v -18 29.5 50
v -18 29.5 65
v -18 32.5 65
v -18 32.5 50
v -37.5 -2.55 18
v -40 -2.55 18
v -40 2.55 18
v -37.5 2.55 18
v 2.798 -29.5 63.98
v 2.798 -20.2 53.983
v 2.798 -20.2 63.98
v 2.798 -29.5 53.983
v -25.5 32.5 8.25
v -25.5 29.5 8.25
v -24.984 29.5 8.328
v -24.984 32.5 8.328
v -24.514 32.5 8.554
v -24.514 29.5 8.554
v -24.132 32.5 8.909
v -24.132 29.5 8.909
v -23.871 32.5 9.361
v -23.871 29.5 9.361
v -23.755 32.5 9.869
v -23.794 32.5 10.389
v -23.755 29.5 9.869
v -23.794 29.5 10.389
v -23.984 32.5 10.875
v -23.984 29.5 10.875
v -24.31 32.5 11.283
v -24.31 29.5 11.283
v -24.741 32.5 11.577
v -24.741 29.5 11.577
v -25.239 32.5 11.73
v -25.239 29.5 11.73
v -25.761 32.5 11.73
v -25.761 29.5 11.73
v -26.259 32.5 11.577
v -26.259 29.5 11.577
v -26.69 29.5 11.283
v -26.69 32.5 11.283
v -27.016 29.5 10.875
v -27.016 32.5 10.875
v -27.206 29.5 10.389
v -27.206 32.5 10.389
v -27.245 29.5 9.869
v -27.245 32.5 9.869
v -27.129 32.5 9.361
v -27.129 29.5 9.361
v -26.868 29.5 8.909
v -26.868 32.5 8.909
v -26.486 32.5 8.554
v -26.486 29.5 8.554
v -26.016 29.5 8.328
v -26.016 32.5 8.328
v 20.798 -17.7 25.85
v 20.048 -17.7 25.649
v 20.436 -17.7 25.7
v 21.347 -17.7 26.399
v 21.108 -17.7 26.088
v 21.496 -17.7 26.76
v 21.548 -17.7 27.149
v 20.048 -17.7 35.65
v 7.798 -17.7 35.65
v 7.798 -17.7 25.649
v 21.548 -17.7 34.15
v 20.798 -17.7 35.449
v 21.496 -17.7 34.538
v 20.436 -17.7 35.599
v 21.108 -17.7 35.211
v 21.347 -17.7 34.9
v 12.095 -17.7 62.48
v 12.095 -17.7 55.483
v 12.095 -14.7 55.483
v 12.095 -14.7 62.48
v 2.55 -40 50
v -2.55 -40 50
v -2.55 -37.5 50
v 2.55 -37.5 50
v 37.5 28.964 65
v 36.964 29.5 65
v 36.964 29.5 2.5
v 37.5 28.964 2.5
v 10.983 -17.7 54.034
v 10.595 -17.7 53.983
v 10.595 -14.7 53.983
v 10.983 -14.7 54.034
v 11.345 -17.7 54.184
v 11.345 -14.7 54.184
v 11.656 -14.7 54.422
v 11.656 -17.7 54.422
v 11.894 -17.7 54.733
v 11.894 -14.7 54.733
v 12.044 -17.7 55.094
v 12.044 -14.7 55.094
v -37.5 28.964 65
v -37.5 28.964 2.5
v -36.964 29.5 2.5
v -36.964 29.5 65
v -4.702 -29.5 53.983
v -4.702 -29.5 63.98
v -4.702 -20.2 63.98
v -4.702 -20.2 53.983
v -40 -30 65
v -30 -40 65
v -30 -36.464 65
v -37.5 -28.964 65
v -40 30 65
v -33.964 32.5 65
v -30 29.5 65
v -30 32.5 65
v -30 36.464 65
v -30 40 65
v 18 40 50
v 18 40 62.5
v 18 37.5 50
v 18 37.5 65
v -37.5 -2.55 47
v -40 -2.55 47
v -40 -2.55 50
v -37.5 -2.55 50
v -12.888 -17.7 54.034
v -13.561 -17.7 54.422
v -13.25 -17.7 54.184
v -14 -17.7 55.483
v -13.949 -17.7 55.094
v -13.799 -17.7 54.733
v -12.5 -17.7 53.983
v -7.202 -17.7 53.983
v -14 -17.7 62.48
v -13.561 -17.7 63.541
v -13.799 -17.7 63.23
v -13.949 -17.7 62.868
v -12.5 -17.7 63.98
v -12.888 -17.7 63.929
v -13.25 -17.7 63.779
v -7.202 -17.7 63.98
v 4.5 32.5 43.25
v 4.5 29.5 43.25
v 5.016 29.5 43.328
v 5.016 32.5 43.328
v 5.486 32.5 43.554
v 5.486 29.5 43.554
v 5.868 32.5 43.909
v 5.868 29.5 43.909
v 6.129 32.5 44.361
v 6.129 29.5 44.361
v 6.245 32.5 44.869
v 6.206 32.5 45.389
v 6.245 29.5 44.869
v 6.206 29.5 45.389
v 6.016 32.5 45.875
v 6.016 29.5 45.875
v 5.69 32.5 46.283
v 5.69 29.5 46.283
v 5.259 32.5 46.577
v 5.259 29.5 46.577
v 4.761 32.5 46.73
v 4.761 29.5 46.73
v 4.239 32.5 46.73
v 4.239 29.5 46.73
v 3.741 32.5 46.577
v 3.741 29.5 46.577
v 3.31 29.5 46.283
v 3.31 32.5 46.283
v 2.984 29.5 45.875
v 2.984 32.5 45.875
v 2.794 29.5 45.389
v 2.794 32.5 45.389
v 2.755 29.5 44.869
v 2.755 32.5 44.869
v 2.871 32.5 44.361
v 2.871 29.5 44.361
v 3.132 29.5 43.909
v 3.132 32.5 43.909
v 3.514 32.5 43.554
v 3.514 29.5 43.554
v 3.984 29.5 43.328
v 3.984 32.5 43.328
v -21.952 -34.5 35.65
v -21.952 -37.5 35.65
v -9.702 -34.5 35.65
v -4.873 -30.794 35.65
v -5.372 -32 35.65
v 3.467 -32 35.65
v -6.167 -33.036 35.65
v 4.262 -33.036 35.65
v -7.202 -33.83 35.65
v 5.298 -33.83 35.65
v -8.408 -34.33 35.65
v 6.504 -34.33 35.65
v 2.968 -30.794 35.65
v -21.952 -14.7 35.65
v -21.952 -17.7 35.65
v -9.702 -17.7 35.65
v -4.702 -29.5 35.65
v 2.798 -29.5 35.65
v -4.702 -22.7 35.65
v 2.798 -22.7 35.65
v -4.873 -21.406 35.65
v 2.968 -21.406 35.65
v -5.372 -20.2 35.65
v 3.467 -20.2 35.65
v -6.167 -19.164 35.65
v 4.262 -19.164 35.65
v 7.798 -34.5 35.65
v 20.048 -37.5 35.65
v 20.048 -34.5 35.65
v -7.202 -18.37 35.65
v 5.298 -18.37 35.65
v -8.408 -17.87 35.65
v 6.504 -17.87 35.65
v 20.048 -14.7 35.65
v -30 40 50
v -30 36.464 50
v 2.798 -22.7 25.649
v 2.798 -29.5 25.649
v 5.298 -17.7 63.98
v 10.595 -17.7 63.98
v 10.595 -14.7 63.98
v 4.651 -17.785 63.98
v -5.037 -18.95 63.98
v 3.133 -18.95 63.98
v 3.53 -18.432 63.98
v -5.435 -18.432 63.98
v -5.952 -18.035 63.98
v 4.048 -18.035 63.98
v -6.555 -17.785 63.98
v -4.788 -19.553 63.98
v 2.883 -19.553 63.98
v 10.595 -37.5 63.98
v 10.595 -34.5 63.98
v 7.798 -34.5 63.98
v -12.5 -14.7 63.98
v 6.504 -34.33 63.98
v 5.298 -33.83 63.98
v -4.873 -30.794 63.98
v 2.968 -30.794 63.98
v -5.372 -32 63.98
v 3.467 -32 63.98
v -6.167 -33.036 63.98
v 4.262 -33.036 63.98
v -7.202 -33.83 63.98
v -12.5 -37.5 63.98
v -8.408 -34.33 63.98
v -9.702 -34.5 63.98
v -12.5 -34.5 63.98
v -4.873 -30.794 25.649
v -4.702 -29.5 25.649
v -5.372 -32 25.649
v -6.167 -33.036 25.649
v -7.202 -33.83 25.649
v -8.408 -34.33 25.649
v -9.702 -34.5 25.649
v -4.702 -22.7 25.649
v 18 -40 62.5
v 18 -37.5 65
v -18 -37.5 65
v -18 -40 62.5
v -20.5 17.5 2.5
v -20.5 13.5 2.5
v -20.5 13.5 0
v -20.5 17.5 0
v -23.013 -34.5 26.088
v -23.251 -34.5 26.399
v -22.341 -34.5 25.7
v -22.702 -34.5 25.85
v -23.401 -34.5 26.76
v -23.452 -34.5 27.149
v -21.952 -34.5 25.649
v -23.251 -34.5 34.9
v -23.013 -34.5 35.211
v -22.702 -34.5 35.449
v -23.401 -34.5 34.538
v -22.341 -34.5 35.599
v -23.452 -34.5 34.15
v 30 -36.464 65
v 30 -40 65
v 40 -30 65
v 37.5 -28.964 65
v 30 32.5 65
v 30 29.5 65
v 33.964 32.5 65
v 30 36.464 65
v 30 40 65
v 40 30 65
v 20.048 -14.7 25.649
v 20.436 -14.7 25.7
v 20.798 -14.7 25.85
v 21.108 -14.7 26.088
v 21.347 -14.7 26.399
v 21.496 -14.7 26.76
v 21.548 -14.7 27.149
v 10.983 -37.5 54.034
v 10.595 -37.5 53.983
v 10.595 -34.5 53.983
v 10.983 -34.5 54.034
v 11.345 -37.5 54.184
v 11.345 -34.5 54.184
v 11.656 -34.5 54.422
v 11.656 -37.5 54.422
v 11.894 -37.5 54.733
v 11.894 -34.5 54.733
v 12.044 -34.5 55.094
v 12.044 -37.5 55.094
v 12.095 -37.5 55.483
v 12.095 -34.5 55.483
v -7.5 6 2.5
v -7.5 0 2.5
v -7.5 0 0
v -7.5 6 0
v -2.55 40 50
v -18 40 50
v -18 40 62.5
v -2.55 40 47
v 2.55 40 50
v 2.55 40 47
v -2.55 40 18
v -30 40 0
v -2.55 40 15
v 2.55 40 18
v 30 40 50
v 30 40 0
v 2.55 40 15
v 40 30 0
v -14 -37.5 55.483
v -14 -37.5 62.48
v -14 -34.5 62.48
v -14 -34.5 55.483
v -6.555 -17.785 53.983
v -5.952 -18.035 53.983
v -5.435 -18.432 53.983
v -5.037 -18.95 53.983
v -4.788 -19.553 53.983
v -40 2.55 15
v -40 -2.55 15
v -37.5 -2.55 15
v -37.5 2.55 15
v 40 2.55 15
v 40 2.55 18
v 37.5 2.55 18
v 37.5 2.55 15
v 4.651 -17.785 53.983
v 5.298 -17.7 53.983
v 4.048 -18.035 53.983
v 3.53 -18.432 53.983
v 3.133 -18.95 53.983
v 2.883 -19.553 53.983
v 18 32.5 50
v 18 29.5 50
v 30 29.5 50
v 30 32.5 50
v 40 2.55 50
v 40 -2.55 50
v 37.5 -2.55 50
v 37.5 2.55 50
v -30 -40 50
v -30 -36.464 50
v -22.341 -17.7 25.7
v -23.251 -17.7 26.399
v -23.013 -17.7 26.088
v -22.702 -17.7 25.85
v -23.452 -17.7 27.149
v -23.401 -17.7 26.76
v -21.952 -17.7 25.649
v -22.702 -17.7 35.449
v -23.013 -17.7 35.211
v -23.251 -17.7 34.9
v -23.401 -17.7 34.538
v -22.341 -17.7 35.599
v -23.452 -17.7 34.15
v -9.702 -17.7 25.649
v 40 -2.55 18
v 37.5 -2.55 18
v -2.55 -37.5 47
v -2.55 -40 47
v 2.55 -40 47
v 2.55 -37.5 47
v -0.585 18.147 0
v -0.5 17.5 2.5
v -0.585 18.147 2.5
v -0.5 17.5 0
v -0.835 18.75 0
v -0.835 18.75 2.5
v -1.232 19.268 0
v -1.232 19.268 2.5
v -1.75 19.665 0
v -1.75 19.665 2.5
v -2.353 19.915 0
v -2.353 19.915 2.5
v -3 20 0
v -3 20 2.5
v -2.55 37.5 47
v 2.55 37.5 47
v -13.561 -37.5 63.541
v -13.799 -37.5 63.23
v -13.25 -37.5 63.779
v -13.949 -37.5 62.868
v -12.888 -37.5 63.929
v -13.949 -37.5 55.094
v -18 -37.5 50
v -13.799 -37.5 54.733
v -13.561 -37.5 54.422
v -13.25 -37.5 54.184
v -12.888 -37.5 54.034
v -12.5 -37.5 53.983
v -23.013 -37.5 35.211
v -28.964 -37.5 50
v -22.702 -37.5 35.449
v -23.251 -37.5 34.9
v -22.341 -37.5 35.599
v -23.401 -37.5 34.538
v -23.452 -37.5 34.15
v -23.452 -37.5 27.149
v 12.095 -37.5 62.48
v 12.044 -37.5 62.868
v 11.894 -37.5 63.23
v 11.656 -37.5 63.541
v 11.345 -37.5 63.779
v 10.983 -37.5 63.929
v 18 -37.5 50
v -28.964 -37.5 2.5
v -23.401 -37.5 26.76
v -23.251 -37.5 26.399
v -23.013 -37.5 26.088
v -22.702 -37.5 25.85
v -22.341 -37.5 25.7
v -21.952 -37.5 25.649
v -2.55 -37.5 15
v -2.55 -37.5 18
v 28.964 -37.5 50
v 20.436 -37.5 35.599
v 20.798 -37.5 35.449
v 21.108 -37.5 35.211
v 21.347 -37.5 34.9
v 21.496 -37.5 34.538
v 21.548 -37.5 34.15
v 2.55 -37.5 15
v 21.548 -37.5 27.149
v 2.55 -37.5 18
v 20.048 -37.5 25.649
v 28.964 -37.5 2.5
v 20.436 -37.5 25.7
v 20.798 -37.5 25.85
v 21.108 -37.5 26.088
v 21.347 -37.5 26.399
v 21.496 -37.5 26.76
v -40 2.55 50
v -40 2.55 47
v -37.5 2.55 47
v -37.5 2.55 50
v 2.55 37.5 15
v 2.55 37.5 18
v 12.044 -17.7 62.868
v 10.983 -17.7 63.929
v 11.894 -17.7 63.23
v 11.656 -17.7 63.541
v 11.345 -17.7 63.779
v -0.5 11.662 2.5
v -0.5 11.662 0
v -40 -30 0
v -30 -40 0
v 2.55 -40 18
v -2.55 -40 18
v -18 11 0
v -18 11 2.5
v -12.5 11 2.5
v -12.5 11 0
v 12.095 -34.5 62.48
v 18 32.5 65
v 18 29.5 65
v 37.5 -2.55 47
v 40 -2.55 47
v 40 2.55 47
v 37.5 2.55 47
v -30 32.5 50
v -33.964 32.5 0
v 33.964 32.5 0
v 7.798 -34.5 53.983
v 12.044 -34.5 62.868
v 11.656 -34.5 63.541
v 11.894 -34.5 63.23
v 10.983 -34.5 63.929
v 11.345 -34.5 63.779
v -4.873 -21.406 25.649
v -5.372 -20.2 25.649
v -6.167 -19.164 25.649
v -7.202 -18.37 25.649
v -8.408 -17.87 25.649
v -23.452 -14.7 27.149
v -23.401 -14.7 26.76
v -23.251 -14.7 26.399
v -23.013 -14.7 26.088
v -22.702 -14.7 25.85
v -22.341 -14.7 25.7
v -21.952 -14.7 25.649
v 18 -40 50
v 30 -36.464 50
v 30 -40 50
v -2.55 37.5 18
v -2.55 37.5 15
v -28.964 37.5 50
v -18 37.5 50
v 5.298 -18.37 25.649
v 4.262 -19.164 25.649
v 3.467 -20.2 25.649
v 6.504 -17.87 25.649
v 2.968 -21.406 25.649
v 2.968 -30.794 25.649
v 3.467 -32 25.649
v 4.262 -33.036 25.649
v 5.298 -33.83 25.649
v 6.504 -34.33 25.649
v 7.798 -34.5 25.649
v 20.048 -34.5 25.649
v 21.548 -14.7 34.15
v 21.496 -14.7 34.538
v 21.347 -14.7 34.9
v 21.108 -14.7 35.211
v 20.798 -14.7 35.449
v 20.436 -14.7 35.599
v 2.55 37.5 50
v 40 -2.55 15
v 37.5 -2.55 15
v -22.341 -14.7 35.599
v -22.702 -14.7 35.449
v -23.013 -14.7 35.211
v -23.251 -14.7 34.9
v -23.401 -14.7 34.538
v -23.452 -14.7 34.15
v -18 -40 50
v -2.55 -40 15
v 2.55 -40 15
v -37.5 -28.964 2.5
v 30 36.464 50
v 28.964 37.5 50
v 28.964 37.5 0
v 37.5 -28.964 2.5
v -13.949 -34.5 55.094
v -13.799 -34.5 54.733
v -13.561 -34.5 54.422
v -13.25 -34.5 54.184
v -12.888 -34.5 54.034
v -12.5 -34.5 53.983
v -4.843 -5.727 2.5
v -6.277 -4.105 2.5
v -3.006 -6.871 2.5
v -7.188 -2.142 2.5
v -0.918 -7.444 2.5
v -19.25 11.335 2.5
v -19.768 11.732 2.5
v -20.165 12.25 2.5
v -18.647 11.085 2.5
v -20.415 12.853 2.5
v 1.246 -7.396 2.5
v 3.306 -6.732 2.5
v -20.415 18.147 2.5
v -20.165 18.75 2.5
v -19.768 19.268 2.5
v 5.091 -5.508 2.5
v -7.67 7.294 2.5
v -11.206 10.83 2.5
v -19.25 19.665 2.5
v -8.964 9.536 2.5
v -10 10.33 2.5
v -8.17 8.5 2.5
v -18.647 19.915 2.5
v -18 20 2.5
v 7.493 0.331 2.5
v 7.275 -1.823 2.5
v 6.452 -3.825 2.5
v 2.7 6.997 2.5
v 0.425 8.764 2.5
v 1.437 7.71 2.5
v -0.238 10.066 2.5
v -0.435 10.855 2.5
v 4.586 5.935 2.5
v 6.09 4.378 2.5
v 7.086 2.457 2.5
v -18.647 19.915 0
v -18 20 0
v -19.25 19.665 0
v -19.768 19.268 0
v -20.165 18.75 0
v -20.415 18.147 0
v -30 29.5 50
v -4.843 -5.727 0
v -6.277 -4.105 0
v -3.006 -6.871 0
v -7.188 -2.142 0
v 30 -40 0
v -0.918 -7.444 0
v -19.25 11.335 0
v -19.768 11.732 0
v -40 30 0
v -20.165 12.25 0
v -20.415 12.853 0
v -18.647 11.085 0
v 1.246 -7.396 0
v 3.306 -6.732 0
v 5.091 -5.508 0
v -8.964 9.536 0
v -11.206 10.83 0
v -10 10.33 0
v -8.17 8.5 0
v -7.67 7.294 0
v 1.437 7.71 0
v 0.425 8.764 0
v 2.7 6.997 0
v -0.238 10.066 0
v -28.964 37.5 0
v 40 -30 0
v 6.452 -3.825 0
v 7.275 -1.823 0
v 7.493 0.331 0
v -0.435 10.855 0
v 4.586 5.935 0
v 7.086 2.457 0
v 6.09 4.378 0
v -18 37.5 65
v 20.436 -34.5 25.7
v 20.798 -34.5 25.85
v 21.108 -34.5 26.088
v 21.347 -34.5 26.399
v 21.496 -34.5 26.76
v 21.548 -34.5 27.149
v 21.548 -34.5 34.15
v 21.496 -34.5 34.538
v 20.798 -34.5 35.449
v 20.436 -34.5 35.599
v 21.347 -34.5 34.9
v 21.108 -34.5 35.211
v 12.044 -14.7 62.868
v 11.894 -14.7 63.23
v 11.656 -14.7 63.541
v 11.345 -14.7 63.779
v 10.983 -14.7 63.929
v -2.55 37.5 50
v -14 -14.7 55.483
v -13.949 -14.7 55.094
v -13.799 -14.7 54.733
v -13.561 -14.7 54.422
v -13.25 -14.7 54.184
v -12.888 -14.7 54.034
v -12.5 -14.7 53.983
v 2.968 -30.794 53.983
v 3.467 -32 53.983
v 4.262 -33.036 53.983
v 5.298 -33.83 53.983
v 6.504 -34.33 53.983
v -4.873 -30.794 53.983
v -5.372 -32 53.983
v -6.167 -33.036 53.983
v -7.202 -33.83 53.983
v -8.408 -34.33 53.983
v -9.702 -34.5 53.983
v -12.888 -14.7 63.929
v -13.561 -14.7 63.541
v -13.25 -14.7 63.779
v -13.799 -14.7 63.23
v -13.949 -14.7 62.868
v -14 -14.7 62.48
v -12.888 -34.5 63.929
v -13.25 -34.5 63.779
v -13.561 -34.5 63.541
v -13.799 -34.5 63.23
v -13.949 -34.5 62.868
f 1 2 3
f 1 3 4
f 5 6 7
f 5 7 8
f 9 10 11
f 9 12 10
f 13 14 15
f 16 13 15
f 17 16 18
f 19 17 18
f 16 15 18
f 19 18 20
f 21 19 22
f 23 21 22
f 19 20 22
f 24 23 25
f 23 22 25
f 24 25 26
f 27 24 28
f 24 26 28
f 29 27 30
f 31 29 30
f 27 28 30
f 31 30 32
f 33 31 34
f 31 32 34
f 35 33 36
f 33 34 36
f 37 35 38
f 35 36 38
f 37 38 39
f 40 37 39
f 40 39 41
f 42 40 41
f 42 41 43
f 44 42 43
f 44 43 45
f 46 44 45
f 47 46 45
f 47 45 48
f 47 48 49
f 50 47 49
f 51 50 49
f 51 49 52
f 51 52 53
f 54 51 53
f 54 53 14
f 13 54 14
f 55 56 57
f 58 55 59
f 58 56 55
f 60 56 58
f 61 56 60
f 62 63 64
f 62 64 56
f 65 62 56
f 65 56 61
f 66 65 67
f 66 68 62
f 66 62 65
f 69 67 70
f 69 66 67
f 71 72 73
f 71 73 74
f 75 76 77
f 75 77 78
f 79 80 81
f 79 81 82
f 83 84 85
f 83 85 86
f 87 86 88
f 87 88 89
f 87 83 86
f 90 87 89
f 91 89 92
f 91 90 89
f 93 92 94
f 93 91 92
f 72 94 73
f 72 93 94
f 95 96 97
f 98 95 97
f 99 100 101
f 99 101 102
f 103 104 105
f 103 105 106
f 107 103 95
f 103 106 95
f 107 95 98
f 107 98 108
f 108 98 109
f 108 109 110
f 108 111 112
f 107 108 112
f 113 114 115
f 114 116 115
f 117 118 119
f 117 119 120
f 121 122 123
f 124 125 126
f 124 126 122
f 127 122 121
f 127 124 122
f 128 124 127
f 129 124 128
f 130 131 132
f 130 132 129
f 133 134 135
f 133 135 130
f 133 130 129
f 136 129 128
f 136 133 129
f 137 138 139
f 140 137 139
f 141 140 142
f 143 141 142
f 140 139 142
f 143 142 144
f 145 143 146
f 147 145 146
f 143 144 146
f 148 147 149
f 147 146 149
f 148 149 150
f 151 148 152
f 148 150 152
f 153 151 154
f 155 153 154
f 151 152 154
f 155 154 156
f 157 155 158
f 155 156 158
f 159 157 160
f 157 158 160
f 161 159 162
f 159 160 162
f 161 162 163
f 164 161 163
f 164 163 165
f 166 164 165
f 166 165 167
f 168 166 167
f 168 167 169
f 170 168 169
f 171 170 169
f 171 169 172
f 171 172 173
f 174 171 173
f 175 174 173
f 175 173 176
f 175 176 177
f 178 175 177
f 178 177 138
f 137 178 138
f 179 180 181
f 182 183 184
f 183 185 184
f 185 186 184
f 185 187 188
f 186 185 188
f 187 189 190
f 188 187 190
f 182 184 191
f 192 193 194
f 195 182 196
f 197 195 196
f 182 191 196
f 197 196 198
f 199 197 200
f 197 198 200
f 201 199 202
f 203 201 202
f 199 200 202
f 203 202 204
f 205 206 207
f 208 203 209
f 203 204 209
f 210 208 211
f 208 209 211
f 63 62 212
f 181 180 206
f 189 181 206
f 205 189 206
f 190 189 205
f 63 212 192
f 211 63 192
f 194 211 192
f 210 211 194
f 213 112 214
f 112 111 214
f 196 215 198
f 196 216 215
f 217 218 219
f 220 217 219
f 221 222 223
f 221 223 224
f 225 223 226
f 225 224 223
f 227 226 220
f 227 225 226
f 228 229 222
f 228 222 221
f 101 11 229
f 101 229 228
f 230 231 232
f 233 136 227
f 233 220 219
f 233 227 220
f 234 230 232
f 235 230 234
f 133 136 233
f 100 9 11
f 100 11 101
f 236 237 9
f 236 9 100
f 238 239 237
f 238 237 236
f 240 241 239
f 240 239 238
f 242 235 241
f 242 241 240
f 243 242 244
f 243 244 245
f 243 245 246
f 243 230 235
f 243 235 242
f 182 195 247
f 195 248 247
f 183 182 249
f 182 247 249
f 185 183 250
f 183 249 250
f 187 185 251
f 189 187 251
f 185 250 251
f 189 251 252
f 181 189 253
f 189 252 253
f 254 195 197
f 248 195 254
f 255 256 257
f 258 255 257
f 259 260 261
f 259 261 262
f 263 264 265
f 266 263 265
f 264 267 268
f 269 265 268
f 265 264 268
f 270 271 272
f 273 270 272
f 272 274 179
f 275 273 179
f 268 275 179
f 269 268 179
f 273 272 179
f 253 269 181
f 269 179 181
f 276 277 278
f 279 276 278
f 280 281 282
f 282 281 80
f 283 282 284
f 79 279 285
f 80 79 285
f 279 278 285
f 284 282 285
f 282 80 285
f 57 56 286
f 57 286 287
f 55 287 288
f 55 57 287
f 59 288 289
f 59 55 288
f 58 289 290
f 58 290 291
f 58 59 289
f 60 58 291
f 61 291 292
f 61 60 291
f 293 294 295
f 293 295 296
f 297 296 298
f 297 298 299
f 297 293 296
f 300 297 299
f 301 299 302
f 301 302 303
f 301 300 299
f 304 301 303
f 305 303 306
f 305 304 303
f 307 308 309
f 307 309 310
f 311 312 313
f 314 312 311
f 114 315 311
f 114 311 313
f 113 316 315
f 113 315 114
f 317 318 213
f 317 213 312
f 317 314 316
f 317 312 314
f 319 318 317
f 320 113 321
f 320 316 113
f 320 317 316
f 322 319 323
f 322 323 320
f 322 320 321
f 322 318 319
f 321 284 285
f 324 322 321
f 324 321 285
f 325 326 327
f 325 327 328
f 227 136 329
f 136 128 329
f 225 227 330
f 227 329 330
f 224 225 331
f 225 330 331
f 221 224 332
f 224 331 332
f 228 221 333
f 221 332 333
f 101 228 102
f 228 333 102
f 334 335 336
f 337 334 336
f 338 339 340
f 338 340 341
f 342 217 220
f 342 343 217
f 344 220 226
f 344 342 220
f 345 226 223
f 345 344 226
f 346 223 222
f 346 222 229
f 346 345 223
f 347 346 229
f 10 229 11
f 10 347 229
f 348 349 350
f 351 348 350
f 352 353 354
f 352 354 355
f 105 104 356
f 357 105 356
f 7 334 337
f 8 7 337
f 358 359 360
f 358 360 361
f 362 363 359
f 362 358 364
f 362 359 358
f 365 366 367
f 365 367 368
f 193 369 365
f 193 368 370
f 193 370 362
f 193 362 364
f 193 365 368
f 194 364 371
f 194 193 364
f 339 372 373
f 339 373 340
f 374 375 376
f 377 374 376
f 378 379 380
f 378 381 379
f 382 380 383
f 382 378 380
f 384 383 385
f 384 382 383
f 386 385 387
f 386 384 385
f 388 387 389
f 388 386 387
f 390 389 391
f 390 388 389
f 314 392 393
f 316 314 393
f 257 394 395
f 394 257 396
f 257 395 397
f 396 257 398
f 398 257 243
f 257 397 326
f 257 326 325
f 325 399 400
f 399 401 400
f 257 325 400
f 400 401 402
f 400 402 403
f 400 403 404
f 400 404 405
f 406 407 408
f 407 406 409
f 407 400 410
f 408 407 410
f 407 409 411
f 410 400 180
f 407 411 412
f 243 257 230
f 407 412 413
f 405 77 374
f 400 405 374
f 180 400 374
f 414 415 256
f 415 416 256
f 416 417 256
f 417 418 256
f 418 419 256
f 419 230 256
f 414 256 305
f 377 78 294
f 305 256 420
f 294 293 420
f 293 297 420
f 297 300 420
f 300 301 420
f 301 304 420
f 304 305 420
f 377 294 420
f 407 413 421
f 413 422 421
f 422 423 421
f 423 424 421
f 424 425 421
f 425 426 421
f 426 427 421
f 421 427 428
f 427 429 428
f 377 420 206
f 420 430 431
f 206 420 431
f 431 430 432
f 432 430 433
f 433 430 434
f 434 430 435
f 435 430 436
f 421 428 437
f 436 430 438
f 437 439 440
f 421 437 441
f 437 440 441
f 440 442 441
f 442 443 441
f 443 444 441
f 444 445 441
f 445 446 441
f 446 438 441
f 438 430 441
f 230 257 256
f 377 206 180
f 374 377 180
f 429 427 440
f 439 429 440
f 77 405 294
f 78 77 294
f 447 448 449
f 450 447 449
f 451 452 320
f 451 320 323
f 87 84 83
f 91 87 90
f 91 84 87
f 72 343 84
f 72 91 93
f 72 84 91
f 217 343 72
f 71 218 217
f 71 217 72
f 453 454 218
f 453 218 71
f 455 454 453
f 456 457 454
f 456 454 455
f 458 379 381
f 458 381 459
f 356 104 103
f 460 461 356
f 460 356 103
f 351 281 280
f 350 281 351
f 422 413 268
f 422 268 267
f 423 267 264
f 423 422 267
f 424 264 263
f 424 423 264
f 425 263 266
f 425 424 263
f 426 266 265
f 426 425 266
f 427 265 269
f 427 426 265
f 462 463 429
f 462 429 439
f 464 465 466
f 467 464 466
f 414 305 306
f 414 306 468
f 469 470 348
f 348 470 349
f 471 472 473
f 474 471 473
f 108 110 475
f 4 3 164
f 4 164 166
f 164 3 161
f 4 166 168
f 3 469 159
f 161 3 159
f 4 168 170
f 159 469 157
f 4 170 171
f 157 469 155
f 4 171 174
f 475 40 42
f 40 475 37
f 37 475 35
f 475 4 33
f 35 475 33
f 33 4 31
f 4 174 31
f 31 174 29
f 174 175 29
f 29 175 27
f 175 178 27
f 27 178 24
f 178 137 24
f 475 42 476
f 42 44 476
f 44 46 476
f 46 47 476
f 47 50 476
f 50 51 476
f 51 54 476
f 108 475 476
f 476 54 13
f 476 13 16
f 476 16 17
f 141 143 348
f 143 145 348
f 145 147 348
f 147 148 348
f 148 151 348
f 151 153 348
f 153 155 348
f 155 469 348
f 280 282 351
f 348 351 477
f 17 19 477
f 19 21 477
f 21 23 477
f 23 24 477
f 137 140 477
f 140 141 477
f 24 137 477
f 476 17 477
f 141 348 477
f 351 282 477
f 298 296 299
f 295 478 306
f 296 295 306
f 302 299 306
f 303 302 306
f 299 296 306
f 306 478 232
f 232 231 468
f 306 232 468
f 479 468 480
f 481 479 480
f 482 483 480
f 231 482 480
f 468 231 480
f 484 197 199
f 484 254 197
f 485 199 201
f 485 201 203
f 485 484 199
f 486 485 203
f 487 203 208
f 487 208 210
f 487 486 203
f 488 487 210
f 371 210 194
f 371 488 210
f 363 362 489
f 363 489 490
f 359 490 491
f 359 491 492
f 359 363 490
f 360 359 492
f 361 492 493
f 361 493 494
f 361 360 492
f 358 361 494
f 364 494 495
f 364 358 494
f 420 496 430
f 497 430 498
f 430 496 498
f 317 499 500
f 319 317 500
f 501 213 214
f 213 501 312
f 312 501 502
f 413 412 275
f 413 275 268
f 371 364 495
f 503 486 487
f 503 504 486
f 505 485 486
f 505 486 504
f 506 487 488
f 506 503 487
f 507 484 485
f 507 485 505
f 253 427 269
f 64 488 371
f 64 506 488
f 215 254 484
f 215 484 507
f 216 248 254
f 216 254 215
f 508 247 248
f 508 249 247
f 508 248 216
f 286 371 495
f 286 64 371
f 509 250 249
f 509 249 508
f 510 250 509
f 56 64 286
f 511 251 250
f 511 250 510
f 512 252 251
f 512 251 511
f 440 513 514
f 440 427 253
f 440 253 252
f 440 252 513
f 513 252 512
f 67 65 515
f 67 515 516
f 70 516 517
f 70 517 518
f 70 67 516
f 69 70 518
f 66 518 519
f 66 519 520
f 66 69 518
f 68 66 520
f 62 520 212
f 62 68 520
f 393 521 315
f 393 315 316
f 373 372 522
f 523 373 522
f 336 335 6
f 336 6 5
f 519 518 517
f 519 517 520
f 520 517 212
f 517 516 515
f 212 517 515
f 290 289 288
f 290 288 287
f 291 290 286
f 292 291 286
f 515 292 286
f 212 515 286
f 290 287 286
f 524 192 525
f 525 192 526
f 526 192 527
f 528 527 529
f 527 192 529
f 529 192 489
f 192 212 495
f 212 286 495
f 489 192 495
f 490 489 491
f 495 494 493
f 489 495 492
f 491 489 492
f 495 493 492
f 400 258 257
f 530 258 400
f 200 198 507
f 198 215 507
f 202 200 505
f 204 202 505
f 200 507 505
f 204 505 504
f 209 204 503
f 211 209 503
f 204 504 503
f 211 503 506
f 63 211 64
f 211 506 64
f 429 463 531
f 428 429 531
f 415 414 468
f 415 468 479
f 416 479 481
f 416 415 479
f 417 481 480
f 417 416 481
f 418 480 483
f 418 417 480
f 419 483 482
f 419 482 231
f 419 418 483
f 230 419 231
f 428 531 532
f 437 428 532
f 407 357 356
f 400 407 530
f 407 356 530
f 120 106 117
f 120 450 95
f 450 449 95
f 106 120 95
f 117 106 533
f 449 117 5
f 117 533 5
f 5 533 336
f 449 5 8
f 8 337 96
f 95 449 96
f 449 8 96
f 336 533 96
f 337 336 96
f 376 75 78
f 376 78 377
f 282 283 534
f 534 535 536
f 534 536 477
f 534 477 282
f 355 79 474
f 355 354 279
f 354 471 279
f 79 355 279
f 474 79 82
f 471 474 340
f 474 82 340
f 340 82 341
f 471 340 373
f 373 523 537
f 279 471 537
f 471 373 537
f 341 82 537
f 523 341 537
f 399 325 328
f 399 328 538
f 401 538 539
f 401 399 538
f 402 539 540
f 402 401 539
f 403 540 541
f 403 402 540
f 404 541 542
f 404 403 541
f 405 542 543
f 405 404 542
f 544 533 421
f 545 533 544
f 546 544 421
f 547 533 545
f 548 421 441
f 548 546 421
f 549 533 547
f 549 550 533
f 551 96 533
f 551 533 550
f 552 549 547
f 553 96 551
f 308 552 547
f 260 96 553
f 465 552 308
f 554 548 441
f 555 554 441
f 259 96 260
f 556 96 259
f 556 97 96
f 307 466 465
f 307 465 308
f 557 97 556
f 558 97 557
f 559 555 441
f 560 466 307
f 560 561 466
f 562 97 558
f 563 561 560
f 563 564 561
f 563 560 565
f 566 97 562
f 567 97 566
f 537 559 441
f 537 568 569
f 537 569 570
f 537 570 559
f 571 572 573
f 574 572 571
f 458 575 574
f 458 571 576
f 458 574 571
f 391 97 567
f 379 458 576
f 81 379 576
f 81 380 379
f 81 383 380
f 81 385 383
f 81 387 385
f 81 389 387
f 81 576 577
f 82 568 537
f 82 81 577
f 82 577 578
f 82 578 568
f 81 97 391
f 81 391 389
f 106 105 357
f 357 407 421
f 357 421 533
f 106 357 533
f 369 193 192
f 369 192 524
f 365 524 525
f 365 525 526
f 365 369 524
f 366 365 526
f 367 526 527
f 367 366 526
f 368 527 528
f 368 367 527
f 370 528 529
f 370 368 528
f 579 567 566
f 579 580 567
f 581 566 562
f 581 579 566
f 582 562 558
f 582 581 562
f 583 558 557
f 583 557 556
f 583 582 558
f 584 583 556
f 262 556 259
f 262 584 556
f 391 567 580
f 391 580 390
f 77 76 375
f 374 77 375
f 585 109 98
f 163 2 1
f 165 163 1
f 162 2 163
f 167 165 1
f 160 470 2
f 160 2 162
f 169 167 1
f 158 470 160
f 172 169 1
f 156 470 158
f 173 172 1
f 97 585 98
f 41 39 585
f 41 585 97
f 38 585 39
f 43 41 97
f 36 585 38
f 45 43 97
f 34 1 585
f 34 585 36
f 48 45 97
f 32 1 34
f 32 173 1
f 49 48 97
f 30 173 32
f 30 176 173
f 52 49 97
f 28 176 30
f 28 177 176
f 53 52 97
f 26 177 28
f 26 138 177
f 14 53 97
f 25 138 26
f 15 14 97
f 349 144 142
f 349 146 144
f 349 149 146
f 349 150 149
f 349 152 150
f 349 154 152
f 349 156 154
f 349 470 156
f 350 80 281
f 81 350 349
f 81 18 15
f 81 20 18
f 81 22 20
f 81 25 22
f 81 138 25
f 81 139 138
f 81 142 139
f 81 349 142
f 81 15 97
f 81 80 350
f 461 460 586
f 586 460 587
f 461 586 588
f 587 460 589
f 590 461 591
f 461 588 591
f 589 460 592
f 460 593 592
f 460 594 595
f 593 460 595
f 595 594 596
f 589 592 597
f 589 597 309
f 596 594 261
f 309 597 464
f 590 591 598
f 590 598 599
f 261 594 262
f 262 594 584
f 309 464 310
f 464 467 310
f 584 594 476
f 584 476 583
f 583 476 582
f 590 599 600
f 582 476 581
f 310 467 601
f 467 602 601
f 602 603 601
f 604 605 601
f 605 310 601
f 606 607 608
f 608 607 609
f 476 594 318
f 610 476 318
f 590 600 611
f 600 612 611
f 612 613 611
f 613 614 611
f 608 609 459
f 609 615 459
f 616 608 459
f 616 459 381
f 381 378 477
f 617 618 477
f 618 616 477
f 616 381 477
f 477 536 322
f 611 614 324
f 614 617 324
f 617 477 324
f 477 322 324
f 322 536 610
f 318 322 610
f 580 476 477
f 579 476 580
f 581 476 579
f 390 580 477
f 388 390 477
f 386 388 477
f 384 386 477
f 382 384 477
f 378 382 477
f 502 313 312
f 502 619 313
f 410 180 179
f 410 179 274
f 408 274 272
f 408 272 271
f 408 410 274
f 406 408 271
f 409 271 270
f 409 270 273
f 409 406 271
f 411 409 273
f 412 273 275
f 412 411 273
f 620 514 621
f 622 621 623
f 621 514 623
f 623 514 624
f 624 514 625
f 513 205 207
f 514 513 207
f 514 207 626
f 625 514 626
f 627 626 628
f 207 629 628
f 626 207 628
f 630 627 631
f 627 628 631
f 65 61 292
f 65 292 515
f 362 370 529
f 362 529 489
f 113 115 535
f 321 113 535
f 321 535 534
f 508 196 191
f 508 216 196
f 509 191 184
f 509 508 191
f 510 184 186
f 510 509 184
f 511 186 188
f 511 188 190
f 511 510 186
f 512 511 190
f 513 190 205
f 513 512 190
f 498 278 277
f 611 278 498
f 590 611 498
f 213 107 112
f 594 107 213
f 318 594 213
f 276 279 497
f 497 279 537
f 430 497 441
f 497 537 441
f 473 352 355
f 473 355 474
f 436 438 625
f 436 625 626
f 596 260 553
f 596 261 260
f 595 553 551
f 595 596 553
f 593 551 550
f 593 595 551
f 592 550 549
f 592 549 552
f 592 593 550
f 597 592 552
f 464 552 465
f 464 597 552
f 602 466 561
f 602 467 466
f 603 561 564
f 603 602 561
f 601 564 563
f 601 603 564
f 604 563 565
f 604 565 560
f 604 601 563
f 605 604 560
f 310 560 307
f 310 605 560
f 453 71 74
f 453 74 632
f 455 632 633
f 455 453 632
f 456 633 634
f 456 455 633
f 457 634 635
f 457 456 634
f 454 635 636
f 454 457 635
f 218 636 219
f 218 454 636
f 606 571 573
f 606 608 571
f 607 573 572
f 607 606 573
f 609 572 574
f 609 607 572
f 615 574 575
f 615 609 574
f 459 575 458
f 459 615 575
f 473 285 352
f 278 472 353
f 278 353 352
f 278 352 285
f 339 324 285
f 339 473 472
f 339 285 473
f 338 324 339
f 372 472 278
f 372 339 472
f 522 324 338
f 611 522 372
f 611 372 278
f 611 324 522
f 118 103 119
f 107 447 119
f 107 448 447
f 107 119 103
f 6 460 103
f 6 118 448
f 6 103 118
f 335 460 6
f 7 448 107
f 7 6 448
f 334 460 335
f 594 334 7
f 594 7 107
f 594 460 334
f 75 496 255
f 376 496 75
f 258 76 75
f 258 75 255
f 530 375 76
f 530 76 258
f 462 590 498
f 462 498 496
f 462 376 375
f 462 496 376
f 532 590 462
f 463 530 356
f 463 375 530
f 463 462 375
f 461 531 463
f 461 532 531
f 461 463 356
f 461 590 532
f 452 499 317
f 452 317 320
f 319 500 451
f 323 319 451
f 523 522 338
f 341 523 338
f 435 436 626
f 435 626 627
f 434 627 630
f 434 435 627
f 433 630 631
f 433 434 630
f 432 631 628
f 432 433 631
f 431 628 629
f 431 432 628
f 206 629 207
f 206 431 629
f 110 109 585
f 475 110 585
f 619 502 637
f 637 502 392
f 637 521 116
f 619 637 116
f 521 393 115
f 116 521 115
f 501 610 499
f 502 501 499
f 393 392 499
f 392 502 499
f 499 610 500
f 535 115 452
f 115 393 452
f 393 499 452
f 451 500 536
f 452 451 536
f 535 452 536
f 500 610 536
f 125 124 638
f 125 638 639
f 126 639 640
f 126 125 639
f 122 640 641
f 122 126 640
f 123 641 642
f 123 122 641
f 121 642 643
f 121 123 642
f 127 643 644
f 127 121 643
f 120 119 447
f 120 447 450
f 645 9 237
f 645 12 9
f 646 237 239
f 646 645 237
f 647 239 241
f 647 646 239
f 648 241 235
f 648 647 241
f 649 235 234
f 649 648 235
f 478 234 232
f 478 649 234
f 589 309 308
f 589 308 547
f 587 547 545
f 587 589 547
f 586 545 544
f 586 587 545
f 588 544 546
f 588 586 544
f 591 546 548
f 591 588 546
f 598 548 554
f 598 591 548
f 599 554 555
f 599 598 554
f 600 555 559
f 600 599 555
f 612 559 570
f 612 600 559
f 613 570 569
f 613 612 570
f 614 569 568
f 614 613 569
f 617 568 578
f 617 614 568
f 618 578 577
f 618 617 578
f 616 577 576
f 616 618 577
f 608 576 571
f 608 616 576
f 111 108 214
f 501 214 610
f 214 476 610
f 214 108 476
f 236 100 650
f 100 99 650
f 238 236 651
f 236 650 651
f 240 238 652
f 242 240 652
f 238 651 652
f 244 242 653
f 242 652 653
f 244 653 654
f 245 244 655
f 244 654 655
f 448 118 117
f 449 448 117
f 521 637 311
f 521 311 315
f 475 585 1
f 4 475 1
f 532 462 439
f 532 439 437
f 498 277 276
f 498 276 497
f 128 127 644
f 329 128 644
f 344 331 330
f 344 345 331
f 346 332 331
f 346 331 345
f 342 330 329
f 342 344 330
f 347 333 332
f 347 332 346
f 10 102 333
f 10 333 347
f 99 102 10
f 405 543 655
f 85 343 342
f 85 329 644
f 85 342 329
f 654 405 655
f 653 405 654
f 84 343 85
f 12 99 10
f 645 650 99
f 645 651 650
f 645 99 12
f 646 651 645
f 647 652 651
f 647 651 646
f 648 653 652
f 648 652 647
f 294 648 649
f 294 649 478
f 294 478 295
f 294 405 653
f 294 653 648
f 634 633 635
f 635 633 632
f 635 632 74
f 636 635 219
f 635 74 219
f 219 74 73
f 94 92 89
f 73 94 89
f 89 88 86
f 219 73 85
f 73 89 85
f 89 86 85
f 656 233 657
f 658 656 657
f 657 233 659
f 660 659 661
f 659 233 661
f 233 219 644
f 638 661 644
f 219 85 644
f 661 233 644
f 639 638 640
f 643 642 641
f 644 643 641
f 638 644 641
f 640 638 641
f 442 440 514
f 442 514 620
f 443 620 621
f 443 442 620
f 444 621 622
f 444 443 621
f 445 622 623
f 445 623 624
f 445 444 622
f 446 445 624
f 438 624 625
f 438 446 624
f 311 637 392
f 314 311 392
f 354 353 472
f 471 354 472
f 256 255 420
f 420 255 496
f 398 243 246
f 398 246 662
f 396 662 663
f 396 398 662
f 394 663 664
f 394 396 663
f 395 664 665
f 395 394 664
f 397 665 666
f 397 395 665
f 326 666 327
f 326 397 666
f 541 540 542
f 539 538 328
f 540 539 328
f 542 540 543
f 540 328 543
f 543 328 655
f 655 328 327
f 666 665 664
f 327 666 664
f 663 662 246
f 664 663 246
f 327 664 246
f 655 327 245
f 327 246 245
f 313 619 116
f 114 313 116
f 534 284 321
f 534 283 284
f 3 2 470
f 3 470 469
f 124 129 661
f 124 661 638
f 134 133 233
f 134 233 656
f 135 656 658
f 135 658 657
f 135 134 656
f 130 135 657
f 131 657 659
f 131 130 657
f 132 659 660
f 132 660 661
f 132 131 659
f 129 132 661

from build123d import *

# Parameters (mm, degrees)
BOSS_EXTRUDE1_DEPTH             = 65
SKETCH2_R                       = 7.5
BOSS_EXTRUDE2_DEPTH             = 2.5
BOSS_EXTRUDE3_REACH             = 88.168
SKETCH3_W                       = 65
SKETCH3_H                       = 3
BOSS_EXTRUDE3_DIRECTION_2_REACH = 88.168
CUT_EXTRUDE2_REACH              = 124.042
SKETCH6_R                       = 1.75
CUT_EXTRUDE3_REACH              = 86.299
CUT_EXTRUDE4_REACH              = 86.299
FILLET1_R                       = 2.5
FILLET2_R                       = 5
CUT_EXTRUDE5_DEPTH              = 111.566722046
CUT_EXTRUDE5_DEPTH_BACK         = 111.566722046
SKETCH9_W                       = 12
SKETCH9_H                       = 32.949220019
SKETCH9_H_2                     = 17.949220019
BOSS_EXTRUDE5_DEPTH             = 22.8
SKETCH11_W                      = 18.75
SKETCH11_H                      = 16.8
CUT_EXTRUDE6_DEPTH              = 61.48
CHAMFER1_SIZE                   = 2.5
FILLET3_R                       = 5
FILLET4_R                       = 2.5
CUT_EXTRUDE8_REACH              = 112.567
SKETCH14_W                      = 3
SKETCH14_H                      = 5.1
CIRPATTERN1_START               = -40
CIRPATTERN1_OUTLINE_W           = 5.1
CIRPATTERN1_OUTLINE_H           = 3
CIRPATTERN1_DEPTH               = 25.3
CIRPATTERN1_START_2             = -2.55
CIRPATTERN1_2_OUTLINE_W         = 2.5
CIRPATTERN1_2_OUTLINE_H         = 3
CIRPATTERN1_2_DEPTH             = 5.1
CIRPATTERN1_START_3             = 37.5
CIRPATTERN1_3_OUTLINE_W         = 5.1
CIRPATTERN1_3_OUTLINE_H         = 3
CIRPATTERN1_3_DEPTH             = 2.5
CUT_EXTRUDE9_REACH              = 89.502
SKETCH15_W                      = 18.33254108
SKETCH15_H                      = 22.8


# Read off the part's stored shape, not the designer's step: CirPattern1
with BuildPart() as part:
    # Sketch1 → Boss-Extrude1 (new body)
    with BuildSketch(Plane.XY):
        Polygon((-40, 30), (-30, 40), (30, 40), (40, 30), (40, -30), (30, -40), (-30, -40), (-40, -30), align=None)
        Polygon((-37.5, 28.964466094), (-28.964466094, 37.5), (28.964466094, 37.5), (37.5, 28.964466094), (37.5, -28.964466094), (28.964466094, -37.5), (-28.964466094, -37.5), (-37.5, -28.964466094), align=None, mode=Mode.SUBTRACT)
    extrude(amount=BOSS_EXTRUDE1_DEPTH)

    # Sketch2 → Boss-Extrude2 (add)
    with BuildSketch(Plane.XY):
        Polygon((37.5, 28.964466094), (28.964466094, 37.5), (-28.964466094, 37.5), (-37.5, 28.964466094), (-37.5, -28.964466094), (-28.964466094, -37.5), (28.964466094, -37.5), (37.5, -28.964466094), align=None)
        Circle(SKETCH2_R, mode=Mode.SUBTRACT)
    extrude(amount=BOSS_EXTRUDE2_DEPTH)

    # Boss-Extrude3: up to this plane
    boss_extrude3_end = Plane(origin=(28.964466094, 37.5, 65), z_dir=(-0.7071067811865476, -0.7071067811865476, 0))
    # Sketch3 → Boss-Extrude3 (add, up to the surface)
    with BuildSketch(Plane(origin=(0, 0, 0), x_dir=(0, 0, -1), z_dir=(1, 0, 0)), mode=Mode.PRIVATE) as boss_extrude3_sk1:
        with Locations((-32.5, 31)):
            Rectangle(SKETCH3_W, SKETCH3_H)
    boss_extrude3_tool1 = split(extrude(boss_extrude3_sk1.sketch, amount=BOSS_EXTRUDE3_REACH, mode=Mode.PRIVATE), bisect_by=boss_extrude3_end, keep=Keep.BOTH, mode=Mode.PRIVATE)
    add(boss_extrude3_tool1.solids().sort_by_distance((0, 31, 32.5))[0])

    # Boss-Extrude3 direction 2: up to this plane
    boss_extrude3_direction_2_end = Plane(origin=(-37.5, 28.964466094, 65), z_dir=(0.707106781186547, -0.7071067811865481, 0))
    # Sketch3 → Boss-Extrude3 direction 2 (add, up to the surface)
    with BuildSketch(Plane(origin=(0, 0, 0), x_dir=(0, 0, -1), z_dir=(1, 0, 0)), mode=Mode.PRIVATE) as boss_extrude3_direction_2_sk1:
        with Locations((-32.5, 31)):
            Rectangle(SKETCH3_W, SKETCH3_H)
    boss_extrude3_direction_2_tool1 = split(extrude(boss_extrude3_direction_2_sk1.sketch, amount=-BOSS_EXTRUDE3_DIRECTION_2_REACH, mode=Mode.PRIVATE), bisect_by=boss_extrude3_direction_2_end, keep=Keep.BOTH, mode=Mode.PRIVATE)
    add(boss_extrude3_direction_2_tool1.solids().sort_by_distance((0, 31, 32.5))[0])

    # Sketch6 → Cut-Extrude2 (cut, up to next)
    with BuildSketch(Plane(origin=(0, 29.5, -27), x_dir=(-1, 0, 0), z_dir=(0, -1, 0)), mode=Mode.PRIVATE) as cut_extrude2_sk1:
        with Locations(Location((-4.5, -72, 0), (0, 0, 90))):
            Circle(SKETCH6_R)
    cut_extrude2_tool1 = extrude(cut_extrude2_sk1.sketch, amount=-CUT_EXTRUDE2_REACH, mode=Mode.PRIVATE) & part.part
    # Sketch6 → Cut-Extrude2 (cut, up to next)
    with BuildSketch(Plane(origin=(0, 29.5, -27), x_dir=(-1, 0, 0), z_dir=(0, -1, 0)), mode=Mode.PRIVATE) as cut_extrude2_sk2:
        with Locations(Location((25.5, -37, 0), (0, 0, 90))):
            Circle(SKETCH6_R)
    cut_extrude2_tool2 = extrude(cut_extrude2_sk2.sketch, amount=-CUT_EXTRUDE2_REACH, mode=Mode.PRIVATE) & part.part
    add(cut_extrude2_tool1.solids().sort_by_distance((4.5, 29.5, 45))[0], mode=Mode.SUBTRACT)
    add(cut_extrude2_tool2.solids().sort_by_distance((-25.5, 29.5, 10))[0], mode=Mode.SUBTRACT)

    # Sketch7 → Cut-Extrude3 (cut, up to next)
    with BuildSketch(Plane.XY.offset(2.5), mode=Mode.PRIVATE) as cut_extrude3_sk1:
        Polygon((-33.964466094, 32.5), (-28.964466094, 37.5), (28.964466094, 37.5), (33.964466094, 32.5), align=None)
    cut_extrude3_tool1 = extrude(cut_extrude3_sk1.sketch, amount=-CUT_EXTRUDE3_REACH, mode=Mode.PRIVATE) & part.part
    add(cut_extrude3_tool1.solids().sort_by_distance((0, 34.933788, 2.5))[0], mode=Mode.SUBTRACT)

    # Sketch8 → Cut-Extrude4 (cut, up to next)
    with BuildSketch(Plane.XY.offset(2.5), mode=Mode.PRIVATE) as cut_extrude4_sk1:
        Polygon((-7.5, 0), (-7.5, 11), (-10.5, 11), (-20.5, 11), (-20.5, 20), (-0.5, 20), (-0.5, 7.5), (0, 7.5), align=None)
    cut_extrude4_tool1 = extrude(cut_extrude4_sk1.sketch, amount=-CUT_EXTRUDE4_REACH, mode=Mode.PRIVATE) & part.part
    add(cut_extrude4_tool1.solids().sort_by_distance((-9.150457, 13.572273, 2.5))[0], mode=Mode.SUBTRACT)

    # Fillet1
    fillet1_edges = [part.edges().sort_by_distance(p)[0] for p in [
        (-20.5, 11, 1.25),
        (-20.5, 20, 1.25),
        (-0.5, 20, 1.25),
    ]]
    fillet(fillet1_edges, radius=FILLET1_R)

    # Fillet2
    fillet2_edges = [part.edges().sort_by_distance(p)[0] for p in [
        (-0.5, 7.5, 1.25),
        (-7.5, 11, 1.25),
    ]]
    fillet(fillet2_edges, radius=FILLET2_R)

    # Sketch9 → Cut-Extrude5 (cut, two sides: drawn at the far end of the back side and taken through both)
    with BuildSketch(Plane(origin=(0, 40, 0), x_dir=(1, 0, 0), z_dir=(0, 1, 0)).offset(-CUT_EXTRUDE5_DEPTH_BACK)):
        with Locations((24, -66.474610009)):
            Rectangle(SKETCH9_W, SKETCH9_H)
        with Locations((-24, -58.97461001)):
            Rectangle(SKETCH9_W, SKETCH9_H_2)
    extrude(amount=CUT_EXTRUDE5_DEPTH + CUT_EXTRUDE5_DEPTH_BACK, mode=Mode.SUBTRACT)

    # Sketch10 → Boss-Extrude5 (add)
    with BuildSketch(Plane(origin=(0, -37.5, 0), x_dir=(1, 0, 0), z_dir=(0, 1, 0))):
        with BuildLine():
            Line((-4.70239318, -35.65016071), (-21.95239318, -35.65016071))
            ThreePointArc((-21.95239318, -35.65016071), (-23.013053352, -35.210820882), (-23.45239318, -34.15016071))
            Line((-23.45239318, -34.15016071), (-23.45239318, -27.14854667))
            ThreePointArc((-23.45239318, -27.14854667), (-23.013053352, -26.087886498), (-21.95239318, -25.64854667))
            Line((-21.95239318, -25.64854667), (20.04760682, -25.64854667))
            ThreePointArc((20.04760682, -25.64854667), (21.108266992, -26.087886498), (21.54760682, -27.14854667))
            Line((21.54760682, -27.14854667), (21.54760682, -34.15016071))
            ThreePointArc((21.54760682, -34.15016071), (21.108266992, -35.210820882), (20.04760682, -35.65016071))
            Line((20.04760682, -35.65016071), (2.79760682, -35.65016071))
            Line((2.79760682, -35.65016071), (2.79760682, -53.98270179))
            Line((2.79760682, -53.98270179), (10.59521364, -53.98270179))
            ThreePointArc((10.59521364, -53.98270179), (11.655873812, -54.422041618), (12.09521364, -55.48270179))
            Line((12.09521364, -55.48270179), (12.09521364, -62.48))
            ThreePointArc((12.09521364, -62.48), (11.655873812, -63.540660172), (10.59521364, -63.98))
            Line((10.59521364, -63.98), (-12.5, -63.98))
            ThreePointArc((-12.5, -63.98), (-13.560660172, -63.540660172), (-14, -62.48))
            Line((-14, -62.48), (-14, -55.48270179))
            ThreePointArc((-14, -55.48270179), (-13.560660172, -54.422041618), (-12.5, -53.98270179))
            Line((-12.5, -53.98270179), (-4.70239318, -53.98270179))
            Line((-4.70239318, -53.98270179), (-4.70239318, -35.65016071))
        make_face()
    extrude(amount=BOSS_EXTRUDE5_DEPTH)

    # Sketch11 → Cut-Extrude6 (cut)
    with BuildSketch(Plane.XY.offset(63.98)):
        with Locations((-14.07739318, -26.1)):
            Rectangle(SKETCH11_W, SKETCH11_H)
        with Locations((12.17260682, -26.1)):
            Rectangle(SKETCH11_W, SKETCH11_H)
    extrude(amount=-CUT_EXTRUDE6_DEPTH, mode=Mode.SUBTRACT)

    # Chamfer1
    chamfer1_edges = [part.edges().sort_by_distance(p)[0] for p in [
        (0, 40, 65),
        (0, -40, 65),
    ]]
    chamfer(chamfer1_edges, length=CHAMFER1_SIZE - 0.0001)  # a hair under: the kernel refuses the full size

    # Fillet3
    fillet3_edges = [part.edges().sort_by_distance(p)[0] for p in [
        (-4.70239318, -17.7, 30.64935369),
        (-4.70239318, -34.5, 30.64935369),
        (-4.70239318, -34.5, 58.981350895),
        (2.79760682, -34.5, 58.981350895),
        (2.79760682, -34.5, 30.64935369),
        (2.79760682, -17.7, 30.64935369),
    ]]
    fillet(fillet3_edges, radius=FILLET3_R)

    # Fillet4
    fillet4_edges = [part.edges().sort_by_distance(p)[0] for p in [
        (-4.70239318, -17.7, 58.981350895),
        (2.79760682, -17.7, 58.981350895),
    ]]
    fillet(fillet4_edges, radius=FILLET4_R)

    # Sketch14 → Cut-Extrude8 (cut, up to next)
    with BuildSketch(Plane(origin=(40, 0, 0), x_dir=(0, 0, -1), z_dir=(1, 0, 0)), mode=Mode.PRIVATE) as cut_extrude8_sk1:
        with Locations((-48.5, 0)):
            Rectangle(SKETCH14_W, SKETCH14_H)
    cut_extrude8_tool1 = extrude(cut_extrude8_sk1.sketch, amount=-CUT_EXTRUDE8_REACH, mode=Mode.PRIVATE) & part.part
    # Sketch14 → Cut-Extrude8 (cut, up to next)
    with BuildSketch(Plane(origin=(40, 0, 0), x_dir=(0, 0, -1), z_dir=(1, 0, 0)), mode=Mode.PRIVATE) as cut_extrude8_sk2:
        with Locations((-16.5, 0)):
            Rectangle(SKETCH14_W, SKETCH14_H)
    cut_extrude8_tool2 = extrude(cut_extrude8_sk2.sketch, amount=-CUT_EXTRUDE8_REACH, mode=Mode.PRIVATE) & part.part
    add(cut_extrude8_tool1.solids().sort_by_distance((40, 0, 48.5))[0], mode=Mode.SUBTRACT)
    add(cut_extrude8_tool2.solids().sort_by_distance((40, 0, 16.5))[0], mode=Mode.SUBTRACT)

    # CirPattern1 outline → CirPattern1 (cut)
    with BuildSketch(Plane(origin=(0, 0, 0), x_dir=(1, 0, 0), z_dir=(0, 1, 0)).offset(CIRPATTERN1_START)):
        with Locations((0, -16.5)):
            Rectangle(CIRPATTERN1_OUTLINE_W, CIRPATTERN1_OUTLINE_H)
        with Locations((0, -48.5)):
            Rectangle(CIRPATTERN1_OUTLINE_W, CIRPATTERN1_OUTLINE_H)
    extrude(amount=CIRPATTERN1_DEPTH, mode=Mode.SUBTRACT)

    # CirPattern1 2 outline → CirPattern1 2 (cut)
    with BuildSketch(Plane(origin=(0, 0, 0), x_dir=(1, 0, 0), z_dir=(0, 1, 0)).offset(CIRPATTERN1_START_2)):
        with Locations((-38.75, -16.5)):
            Rectangle(CIRPATTERN1_2_OUTLINE_W, CIRPATTERN1_2_OUTLINE_H)
        with Locations((-38.75, -48.5)):
            Rectangle(CIRPATTERN1_2_OUTLINE_W, CIRPATTERN1_2_OUTLINE_H)
    extrude(amount=CIRPATTERN1_2_DEPTH, mode=Mode.SUBTRACT)

    # CirPattern1 3 outline → CirPattern1 3 (cut)
    with BuildSketch(Plane(origin=(0, 0, 0), x_dir=(1, 0, 0), z_dir=(0, 1, 0)).offset(CIRPATTERN1_START_3)):
        with Locations((0, -16.5)):
            Rectangle(CIRPATTERN1_3_OUTLINE_W, CIRPATTERN1_3_OUTLINE_H)
        with Locations((0, -48.5)):
            Rectangle(CIRPATTERN1_3_OUTLINE_W, CIRPATTERN1_3_OUTLINE_H)
    extrude(amount=CIRPATTERN1_3_DEPTH, mode=Mode.SUBTRACT)

    # Sketch15 → Cut-Extrude9 (cut, up to next)
    with BuildSketch(Plane(origin=(2.79760682, 0, 0), x_dir=(0, 0, -1), z_dir=(1, 0, 0)), mode=Mode.PRIVATE) as cut_extrude9_sk1:
        with Locations((-44.81643125, -26.1)):
            Rectangle(SKETCH15_W, SKETCH15_H)
    cut_extrude9_tool1 = extrude(cut_extrude9_sk1.sketch, amount=-CUT_EXTRUDE9_REACH, mode=Mode.PRIVATE) & part.part
    add(cut_extrude9_tool1.solids().sort_by_distance((2.797607, -26.1, 44.816431))[0], mode=Mode.SUBTRACT)


solid = part.part
